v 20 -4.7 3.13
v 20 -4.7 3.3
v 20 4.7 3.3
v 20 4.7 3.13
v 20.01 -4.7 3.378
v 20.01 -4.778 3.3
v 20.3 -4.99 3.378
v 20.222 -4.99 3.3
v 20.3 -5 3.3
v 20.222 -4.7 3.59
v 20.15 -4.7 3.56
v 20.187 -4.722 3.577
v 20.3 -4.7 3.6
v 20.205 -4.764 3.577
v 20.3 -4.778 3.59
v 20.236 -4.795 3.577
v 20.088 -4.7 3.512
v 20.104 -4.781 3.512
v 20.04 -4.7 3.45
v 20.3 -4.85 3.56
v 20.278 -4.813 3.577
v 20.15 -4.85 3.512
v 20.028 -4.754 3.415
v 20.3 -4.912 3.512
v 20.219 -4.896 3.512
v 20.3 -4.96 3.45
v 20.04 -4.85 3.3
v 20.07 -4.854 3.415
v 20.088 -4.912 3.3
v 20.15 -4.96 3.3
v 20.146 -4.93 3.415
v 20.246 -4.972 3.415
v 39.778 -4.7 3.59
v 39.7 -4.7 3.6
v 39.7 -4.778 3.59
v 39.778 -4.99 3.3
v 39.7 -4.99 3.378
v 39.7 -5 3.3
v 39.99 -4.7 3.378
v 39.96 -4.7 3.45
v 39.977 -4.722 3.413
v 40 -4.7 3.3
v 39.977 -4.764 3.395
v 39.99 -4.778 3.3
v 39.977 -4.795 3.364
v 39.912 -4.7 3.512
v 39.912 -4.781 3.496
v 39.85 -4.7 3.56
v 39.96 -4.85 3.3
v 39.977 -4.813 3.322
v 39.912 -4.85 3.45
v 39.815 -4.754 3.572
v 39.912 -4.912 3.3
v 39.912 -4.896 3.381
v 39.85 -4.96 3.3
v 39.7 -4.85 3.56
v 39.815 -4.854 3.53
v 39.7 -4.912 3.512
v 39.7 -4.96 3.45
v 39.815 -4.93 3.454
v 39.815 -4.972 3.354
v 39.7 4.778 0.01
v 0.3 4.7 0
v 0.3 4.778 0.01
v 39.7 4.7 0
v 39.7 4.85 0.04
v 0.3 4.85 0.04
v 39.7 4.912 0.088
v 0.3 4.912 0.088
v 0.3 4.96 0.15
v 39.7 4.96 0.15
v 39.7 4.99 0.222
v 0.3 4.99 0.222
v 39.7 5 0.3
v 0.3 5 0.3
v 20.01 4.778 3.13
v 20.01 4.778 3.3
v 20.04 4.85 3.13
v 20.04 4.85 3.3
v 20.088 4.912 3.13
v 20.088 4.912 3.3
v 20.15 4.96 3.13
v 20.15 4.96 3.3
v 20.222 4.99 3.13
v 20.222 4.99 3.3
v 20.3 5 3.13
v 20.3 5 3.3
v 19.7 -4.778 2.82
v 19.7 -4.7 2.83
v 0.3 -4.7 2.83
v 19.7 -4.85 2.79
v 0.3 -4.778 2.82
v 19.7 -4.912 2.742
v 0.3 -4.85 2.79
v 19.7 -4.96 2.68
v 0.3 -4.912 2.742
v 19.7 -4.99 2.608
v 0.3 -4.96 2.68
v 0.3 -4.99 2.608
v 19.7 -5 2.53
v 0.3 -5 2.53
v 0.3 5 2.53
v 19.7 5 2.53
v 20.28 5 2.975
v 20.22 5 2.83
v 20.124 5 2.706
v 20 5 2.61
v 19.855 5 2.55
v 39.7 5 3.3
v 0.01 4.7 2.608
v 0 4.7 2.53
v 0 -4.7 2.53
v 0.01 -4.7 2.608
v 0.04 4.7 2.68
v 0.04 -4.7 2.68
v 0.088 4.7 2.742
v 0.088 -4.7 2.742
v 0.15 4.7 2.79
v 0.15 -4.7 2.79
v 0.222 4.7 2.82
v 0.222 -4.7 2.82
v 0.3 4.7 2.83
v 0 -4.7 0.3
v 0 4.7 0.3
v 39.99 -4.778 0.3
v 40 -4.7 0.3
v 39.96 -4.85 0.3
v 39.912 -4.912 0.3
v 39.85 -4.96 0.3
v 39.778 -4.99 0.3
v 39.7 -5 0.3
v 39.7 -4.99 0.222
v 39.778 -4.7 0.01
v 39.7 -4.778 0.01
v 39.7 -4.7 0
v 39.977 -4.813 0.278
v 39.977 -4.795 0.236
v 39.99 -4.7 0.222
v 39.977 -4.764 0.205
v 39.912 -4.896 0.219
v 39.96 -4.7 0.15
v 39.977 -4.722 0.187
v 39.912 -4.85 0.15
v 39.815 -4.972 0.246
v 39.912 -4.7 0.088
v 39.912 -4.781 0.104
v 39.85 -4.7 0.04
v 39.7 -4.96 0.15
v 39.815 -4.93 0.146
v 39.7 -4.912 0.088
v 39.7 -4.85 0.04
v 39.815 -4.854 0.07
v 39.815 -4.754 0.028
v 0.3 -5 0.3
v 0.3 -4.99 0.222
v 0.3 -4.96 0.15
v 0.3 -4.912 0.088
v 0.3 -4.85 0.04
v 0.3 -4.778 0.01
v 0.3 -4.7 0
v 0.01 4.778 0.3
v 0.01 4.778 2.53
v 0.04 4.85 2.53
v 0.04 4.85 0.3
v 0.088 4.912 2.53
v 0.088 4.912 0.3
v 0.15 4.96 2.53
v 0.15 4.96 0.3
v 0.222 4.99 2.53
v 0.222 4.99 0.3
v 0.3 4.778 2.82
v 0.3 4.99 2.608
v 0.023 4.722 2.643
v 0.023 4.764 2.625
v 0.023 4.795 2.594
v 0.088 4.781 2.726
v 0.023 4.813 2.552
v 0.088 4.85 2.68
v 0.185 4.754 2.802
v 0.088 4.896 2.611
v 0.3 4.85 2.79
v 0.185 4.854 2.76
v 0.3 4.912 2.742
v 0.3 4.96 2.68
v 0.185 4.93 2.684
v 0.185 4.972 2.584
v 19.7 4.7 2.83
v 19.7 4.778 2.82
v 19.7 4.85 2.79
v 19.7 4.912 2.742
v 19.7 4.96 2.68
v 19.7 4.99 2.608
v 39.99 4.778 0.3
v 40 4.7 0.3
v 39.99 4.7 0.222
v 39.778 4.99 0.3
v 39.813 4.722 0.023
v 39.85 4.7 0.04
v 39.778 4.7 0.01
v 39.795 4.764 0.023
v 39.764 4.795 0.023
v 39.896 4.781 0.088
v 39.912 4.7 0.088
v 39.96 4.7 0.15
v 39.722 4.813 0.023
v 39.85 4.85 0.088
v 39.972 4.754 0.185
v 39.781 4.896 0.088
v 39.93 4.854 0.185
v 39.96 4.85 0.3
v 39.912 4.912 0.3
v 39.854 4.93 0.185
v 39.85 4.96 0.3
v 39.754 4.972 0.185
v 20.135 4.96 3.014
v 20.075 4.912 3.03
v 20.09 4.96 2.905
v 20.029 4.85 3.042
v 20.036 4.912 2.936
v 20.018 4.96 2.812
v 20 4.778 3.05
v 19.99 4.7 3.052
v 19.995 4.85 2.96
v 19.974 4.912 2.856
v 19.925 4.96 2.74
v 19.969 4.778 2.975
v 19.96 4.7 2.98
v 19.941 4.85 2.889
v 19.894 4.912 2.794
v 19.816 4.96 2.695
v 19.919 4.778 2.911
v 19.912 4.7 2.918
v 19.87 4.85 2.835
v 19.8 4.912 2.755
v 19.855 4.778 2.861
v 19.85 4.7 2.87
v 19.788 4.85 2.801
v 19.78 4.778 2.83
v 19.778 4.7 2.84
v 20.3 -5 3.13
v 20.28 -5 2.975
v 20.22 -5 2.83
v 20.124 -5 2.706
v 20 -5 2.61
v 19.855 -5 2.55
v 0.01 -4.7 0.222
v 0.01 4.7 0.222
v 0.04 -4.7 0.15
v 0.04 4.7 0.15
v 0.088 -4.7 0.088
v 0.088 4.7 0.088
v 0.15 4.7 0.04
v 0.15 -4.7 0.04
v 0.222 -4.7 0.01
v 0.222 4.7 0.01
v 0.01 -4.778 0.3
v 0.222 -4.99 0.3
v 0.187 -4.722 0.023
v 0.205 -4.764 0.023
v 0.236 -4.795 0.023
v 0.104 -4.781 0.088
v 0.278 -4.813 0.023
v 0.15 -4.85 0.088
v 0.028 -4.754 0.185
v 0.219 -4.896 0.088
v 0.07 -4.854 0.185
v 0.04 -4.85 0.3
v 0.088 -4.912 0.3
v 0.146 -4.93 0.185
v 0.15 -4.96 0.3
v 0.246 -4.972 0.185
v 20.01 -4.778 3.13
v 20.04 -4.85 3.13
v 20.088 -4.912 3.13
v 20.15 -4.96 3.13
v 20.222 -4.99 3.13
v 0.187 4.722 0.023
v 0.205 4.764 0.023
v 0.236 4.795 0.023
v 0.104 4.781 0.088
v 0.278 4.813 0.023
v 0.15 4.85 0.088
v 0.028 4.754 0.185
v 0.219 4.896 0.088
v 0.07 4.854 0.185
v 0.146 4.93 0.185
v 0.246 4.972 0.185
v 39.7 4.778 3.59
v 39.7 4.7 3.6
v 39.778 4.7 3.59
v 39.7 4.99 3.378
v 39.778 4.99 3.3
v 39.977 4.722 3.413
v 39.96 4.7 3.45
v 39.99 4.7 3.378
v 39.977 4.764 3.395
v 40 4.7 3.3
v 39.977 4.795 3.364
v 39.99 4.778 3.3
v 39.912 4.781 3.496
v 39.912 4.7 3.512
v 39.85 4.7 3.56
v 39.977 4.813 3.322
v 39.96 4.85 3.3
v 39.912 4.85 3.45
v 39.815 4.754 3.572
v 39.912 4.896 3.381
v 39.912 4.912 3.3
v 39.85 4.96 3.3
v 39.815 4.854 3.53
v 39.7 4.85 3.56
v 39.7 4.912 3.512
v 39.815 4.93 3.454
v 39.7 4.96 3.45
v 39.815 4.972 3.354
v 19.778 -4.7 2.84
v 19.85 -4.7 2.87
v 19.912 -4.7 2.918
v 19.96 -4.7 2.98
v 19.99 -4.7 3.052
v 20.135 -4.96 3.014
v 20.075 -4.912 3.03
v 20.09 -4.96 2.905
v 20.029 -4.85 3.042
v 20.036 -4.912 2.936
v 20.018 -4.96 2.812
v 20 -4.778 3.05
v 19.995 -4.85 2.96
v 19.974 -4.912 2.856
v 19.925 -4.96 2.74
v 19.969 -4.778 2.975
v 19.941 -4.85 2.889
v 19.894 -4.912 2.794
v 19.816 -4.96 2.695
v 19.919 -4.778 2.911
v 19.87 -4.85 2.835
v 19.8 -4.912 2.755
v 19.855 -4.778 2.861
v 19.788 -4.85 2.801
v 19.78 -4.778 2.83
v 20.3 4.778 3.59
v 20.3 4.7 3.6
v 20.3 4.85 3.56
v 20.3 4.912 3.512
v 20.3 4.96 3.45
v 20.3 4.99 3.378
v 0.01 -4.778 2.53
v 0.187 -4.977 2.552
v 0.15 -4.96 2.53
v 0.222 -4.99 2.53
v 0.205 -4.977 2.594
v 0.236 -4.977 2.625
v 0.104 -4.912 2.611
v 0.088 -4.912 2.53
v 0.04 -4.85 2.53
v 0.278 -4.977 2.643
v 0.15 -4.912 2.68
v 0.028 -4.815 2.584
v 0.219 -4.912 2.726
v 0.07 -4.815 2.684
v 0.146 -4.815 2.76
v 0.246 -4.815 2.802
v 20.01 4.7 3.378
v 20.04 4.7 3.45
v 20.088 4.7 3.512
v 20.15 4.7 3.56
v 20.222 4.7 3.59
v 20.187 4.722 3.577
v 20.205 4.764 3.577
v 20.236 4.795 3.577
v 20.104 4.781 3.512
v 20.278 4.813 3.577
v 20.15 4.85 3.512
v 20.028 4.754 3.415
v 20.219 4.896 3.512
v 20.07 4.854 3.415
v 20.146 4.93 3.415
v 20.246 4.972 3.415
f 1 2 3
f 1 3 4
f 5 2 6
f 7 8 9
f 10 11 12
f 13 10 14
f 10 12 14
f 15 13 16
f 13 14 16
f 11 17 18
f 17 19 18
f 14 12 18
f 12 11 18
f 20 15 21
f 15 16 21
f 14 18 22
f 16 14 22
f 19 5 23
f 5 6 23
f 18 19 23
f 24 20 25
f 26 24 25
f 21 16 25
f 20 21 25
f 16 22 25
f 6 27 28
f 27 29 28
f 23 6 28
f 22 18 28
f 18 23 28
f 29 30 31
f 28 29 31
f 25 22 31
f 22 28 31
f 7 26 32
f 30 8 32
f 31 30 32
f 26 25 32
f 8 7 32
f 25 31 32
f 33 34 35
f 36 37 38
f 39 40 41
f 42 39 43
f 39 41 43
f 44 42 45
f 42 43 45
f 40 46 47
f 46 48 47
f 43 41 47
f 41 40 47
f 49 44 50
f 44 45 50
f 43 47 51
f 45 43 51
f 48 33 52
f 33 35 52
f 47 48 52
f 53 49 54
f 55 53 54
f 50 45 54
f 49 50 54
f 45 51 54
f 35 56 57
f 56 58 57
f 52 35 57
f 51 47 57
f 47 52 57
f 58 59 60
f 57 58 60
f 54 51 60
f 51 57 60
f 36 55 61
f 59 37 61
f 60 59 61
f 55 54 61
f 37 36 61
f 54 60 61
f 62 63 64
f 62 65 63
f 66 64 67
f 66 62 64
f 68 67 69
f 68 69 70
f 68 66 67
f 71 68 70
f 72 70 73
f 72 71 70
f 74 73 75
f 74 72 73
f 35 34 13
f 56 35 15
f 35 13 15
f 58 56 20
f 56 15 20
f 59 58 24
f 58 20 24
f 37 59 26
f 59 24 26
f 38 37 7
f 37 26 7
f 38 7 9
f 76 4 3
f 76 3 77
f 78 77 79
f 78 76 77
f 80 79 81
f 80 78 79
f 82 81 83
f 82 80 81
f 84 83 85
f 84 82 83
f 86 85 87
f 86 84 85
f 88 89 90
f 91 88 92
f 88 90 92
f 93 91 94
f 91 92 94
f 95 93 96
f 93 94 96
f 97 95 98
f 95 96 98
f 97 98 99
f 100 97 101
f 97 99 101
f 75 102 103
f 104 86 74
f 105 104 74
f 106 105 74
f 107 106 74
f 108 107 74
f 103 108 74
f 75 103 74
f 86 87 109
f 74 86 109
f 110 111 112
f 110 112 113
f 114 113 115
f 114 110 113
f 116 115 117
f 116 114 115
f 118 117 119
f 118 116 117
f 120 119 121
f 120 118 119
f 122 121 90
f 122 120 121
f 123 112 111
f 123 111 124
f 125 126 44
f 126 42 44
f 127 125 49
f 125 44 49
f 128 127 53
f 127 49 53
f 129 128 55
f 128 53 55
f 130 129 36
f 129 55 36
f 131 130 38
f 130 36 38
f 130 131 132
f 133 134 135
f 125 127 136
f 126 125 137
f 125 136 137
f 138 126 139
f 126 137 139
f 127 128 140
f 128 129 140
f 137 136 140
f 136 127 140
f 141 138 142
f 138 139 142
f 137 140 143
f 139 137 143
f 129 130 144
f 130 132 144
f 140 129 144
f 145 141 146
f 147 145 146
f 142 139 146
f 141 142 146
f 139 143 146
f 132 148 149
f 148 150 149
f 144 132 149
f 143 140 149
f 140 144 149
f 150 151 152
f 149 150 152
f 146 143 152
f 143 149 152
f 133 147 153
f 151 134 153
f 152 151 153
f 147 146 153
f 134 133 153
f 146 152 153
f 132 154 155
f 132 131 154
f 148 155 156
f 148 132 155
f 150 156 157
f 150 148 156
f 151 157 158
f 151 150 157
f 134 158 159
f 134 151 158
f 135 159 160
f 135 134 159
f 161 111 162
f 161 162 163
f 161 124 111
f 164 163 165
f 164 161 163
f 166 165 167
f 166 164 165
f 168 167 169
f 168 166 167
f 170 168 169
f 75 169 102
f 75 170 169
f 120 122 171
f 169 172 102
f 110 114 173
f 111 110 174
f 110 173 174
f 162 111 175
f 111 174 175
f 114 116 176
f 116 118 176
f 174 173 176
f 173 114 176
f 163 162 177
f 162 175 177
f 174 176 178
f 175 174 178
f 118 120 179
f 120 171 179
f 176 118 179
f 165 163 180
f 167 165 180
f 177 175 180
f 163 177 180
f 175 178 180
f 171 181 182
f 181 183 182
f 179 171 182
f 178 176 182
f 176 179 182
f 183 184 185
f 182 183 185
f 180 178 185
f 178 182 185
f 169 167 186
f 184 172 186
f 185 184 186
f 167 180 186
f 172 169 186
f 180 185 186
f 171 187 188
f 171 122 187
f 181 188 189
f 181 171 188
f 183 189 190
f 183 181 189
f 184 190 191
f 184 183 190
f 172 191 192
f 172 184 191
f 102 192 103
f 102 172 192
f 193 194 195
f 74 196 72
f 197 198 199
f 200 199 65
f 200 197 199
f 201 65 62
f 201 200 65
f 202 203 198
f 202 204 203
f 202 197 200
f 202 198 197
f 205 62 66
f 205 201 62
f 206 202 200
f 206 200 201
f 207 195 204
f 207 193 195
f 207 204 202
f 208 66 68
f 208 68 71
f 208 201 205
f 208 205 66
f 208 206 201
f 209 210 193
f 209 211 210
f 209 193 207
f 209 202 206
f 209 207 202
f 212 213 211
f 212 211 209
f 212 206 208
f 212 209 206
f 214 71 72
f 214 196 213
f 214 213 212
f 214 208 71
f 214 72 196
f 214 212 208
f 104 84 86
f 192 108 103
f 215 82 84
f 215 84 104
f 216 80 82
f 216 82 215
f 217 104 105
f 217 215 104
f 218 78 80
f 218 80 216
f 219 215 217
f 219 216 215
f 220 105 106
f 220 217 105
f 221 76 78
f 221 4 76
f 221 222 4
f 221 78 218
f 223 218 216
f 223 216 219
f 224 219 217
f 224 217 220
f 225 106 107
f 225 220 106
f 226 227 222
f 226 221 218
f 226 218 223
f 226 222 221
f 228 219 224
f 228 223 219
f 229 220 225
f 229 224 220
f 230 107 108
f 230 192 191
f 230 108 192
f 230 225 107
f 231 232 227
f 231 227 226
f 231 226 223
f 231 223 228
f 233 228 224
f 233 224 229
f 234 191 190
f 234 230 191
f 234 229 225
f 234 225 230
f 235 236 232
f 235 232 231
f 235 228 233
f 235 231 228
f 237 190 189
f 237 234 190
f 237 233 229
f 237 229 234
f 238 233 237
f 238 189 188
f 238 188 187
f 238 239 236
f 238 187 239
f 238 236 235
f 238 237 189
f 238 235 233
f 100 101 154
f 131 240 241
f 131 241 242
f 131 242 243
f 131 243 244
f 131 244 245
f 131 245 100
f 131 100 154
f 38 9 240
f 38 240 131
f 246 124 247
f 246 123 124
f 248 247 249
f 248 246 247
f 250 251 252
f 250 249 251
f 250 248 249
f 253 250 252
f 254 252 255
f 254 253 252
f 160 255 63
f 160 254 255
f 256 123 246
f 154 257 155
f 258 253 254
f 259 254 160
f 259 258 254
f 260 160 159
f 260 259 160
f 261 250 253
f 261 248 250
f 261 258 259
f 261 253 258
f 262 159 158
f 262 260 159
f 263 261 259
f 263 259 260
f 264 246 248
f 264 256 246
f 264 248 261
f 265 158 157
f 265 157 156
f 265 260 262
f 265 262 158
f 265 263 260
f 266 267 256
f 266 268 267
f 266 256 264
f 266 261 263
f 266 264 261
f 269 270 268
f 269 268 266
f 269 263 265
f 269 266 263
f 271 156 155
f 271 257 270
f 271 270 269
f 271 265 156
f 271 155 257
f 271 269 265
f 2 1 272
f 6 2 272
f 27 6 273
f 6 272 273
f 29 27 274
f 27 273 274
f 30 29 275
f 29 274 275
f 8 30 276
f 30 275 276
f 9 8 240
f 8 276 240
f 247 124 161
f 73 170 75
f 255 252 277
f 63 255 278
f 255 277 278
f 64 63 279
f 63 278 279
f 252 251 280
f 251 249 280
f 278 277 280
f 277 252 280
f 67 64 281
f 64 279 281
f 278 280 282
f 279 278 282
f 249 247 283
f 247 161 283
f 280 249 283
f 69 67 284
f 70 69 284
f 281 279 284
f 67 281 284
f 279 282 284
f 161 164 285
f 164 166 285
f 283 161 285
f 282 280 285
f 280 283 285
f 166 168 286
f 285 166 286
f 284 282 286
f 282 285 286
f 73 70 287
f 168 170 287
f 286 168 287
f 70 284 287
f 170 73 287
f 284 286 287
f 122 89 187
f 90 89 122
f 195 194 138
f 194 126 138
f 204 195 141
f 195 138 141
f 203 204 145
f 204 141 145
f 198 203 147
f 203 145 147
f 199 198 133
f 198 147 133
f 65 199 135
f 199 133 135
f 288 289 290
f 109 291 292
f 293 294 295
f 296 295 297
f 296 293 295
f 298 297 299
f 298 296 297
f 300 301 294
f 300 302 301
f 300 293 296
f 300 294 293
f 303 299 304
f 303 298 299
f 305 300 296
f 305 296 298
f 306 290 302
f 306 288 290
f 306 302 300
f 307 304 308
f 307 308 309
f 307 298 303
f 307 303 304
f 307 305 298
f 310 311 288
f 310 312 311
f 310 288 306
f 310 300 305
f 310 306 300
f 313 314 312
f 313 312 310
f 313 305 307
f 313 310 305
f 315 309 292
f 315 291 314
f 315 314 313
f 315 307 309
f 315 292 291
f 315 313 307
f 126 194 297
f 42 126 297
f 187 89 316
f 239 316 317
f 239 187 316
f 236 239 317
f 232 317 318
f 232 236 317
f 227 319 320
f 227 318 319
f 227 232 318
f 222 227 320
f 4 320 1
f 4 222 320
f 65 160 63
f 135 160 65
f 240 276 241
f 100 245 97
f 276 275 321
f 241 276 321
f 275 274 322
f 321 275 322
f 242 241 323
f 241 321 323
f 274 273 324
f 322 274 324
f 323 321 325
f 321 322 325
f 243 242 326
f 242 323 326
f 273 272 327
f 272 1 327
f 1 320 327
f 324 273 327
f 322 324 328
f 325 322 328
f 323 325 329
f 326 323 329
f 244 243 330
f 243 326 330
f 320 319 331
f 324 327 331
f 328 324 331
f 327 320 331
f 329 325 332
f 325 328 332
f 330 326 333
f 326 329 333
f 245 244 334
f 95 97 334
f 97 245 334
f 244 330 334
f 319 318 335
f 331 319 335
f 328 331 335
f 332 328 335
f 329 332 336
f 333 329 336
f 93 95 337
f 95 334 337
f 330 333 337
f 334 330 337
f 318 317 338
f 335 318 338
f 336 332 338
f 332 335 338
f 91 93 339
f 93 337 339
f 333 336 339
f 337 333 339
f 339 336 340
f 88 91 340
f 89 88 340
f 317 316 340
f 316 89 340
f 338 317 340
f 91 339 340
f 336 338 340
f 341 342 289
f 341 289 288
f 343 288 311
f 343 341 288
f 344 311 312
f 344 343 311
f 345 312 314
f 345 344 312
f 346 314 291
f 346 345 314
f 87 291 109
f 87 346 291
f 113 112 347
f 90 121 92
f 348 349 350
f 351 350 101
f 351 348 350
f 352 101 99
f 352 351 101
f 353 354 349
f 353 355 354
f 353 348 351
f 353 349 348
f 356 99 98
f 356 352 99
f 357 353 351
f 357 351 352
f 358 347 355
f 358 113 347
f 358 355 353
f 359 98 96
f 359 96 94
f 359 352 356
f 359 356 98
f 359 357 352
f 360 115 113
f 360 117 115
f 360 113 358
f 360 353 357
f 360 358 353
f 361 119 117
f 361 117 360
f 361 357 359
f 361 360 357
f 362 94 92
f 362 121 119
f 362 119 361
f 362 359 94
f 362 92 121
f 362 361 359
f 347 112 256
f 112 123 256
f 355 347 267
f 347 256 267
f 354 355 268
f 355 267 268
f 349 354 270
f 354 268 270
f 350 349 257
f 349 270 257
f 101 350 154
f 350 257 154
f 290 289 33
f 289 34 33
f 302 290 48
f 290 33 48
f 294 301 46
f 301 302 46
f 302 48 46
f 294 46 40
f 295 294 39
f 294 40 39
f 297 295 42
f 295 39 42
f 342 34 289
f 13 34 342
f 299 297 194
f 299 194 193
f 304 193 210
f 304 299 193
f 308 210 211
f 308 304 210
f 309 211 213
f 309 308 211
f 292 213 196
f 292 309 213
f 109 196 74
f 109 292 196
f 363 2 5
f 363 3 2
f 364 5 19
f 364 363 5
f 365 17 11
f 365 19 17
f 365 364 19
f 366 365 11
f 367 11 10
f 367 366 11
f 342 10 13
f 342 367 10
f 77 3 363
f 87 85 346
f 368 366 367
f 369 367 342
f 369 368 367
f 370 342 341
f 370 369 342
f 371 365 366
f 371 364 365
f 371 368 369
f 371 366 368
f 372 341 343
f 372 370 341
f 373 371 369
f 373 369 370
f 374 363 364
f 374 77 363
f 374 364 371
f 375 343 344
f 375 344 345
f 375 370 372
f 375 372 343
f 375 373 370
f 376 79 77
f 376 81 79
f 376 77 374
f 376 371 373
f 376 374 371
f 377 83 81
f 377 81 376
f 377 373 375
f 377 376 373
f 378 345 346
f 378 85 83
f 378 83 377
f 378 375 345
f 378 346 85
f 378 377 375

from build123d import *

# Parameters (mm, degrees)
F1_DEPTH = 5
F2_R     = 0.3


with BuildPart() as f1:
    # F0 (on Front) → F1 (new body, symmetric)
    with BuildSketch(Plane.XZ):
        Polygon((0, 2.83), (0, 0), (40, 0), (40, 3.6), (20, 3.6), (20, 2.83), align=None)
    extrude(amount=F1_DEPTH, both=True)

    # F2
    f2_edges = [f1.edges().sort_by_distance(p)[0] for p in [
        (10, 5, 2.83),
        (0, 0, 2.83),
        (0, 5, 1.415),
        (0, -5, 1.415),
        (0, 0, 0),
        (20, -5, 0),
        (10, -5, 2.83),
        (20, 0, 2.83),
        (20, 5, 3.215),
        (20, -5, 3.215),
        (20, 0, 3.6),
        (30, -5, 3.6),
        (30, 5, 3.6),
        (40, 0, 3.6),
        (40, -5, 1.8),
        (40, 5, 1.8),
        (40, 0, 0),
        (20, 5, 0),
    ]]
    fillet(f2_edges, radius=F2_R)


solid = f1.part
